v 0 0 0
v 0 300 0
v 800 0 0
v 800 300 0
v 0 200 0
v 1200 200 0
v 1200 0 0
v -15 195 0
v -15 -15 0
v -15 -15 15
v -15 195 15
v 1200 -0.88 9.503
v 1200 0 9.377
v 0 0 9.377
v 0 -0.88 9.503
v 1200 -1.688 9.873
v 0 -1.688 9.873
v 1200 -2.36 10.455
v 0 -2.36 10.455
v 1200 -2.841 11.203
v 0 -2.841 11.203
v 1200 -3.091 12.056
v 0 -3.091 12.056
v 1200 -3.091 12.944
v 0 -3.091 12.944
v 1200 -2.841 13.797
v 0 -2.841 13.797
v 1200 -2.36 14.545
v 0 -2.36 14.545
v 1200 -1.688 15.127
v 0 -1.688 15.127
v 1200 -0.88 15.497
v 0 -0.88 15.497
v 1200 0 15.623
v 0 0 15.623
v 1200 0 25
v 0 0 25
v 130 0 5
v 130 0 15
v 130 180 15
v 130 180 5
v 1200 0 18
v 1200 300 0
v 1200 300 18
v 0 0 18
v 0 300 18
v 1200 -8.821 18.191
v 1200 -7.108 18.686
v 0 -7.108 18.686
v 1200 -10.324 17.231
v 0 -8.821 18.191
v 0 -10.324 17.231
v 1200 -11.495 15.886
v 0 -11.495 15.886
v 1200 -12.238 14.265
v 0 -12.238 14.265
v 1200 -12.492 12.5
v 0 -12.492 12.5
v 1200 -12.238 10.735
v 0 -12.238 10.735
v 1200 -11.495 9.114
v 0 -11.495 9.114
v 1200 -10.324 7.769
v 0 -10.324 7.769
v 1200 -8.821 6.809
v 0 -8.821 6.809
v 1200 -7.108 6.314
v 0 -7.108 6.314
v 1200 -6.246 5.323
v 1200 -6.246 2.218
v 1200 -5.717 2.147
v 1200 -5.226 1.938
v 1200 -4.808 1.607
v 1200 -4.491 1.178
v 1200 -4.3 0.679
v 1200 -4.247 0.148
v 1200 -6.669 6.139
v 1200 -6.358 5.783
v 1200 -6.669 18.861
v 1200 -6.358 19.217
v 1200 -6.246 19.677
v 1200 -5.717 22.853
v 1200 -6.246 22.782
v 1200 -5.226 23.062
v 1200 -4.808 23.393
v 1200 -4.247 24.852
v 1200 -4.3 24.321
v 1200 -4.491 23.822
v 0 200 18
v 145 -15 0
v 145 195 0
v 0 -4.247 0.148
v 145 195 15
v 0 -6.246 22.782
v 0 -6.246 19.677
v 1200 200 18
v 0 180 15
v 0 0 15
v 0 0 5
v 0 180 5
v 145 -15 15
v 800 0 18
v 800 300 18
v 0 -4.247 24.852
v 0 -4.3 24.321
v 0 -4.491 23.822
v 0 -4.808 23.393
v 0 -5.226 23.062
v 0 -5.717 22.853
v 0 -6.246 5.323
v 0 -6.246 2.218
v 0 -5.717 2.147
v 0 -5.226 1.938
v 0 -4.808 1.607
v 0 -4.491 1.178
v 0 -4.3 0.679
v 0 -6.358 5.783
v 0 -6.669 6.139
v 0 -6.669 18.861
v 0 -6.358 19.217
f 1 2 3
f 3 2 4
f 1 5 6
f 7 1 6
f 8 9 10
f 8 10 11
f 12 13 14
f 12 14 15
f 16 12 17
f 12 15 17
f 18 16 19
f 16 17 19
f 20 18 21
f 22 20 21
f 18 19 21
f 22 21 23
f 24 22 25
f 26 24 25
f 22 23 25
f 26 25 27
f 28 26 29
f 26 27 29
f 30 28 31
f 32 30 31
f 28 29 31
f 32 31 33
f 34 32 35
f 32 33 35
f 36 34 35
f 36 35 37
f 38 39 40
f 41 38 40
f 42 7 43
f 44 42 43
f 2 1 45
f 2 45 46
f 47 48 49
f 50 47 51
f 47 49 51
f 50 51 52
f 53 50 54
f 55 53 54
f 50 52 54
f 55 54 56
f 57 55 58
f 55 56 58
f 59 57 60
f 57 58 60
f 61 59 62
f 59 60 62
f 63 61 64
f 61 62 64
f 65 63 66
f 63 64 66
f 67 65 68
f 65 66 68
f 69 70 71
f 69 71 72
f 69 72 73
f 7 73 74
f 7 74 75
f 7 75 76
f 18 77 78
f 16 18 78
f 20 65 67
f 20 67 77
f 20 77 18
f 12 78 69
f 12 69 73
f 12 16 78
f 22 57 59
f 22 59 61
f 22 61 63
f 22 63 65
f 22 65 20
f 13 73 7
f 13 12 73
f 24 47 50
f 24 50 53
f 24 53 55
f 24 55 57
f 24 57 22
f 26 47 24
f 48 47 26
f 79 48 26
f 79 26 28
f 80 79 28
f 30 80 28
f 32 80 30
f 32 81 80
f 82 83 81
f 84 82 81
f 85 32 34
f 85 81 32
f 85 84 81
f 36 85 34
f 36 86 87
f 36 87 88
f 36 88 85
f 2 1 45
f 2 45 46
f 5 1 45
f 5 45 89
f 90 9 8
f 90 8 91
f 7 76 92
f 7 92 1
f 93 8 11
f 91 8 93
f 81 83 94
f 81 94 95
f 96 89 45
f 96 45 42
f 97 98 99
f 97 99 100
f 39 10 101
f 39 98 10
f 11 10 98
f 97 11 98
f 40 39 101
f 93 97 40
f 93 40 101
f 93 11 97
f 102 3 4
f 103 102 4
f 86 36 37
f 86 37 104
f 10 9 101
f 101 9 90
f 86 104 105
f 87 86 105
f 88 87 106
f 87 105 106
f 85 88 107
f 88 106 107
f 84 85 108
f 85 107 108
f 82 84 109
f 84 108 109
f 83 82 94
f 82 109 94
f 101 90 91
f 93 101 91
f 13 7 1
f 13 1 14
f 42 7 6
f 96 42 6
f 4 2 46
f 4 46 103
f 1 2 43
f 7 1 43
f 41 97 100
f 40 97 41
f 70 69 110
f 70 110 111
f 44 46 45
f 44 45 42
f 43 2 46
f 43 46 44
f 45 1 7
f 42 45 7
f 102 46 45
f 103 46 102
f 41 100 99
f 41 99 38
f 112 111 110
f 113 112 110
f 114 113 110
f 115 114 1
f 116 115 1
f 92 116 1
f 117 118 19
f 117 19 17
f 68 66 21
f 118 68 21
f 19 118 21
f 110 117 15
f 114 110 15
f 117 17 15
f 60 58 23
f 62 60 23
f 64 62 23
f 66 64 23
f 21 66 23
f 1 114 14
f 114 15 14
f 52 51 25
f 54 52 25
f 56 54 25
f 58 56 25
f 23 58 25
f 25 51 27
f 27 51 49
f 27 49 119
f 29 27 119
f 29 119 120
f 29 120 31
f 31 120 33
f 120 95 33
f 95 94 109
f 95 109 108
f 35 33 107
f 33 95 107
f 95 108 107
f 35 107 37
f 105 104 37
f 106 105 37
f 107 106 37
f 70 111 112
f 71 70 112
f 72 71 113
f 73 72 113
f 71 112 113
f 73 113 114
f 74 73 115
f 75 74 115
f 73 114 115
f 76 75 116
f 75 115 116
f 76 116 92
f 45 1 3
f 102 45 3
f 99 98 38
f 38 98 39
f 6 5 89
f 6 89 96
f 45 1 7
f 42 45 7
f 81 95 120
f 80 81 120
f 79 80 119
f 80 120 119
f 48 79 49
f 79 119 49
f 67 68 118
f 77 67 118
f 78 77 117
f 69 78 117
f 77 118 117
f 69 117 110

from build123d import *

# Parameters (mm, degrees)
F0_W      = 1200
F0_H      = 300
F1_DEPTH  = 18
F2_W      = 1200
F2_H      = 200
F3_DEPTH  = 18
F5_DEPTH  = 1200
F6_W      = 800
F6_H      = 300
F7_DEPTH  = 18
F8_W      = 160
F8_H      = 210
F9_DEPTH  = 15
F10_W     = 130
F10_H     = 180
F11_DEPTH = 10


with BuildPart() as f1:
    # F0 (on Top) → F1 (new body)
    with BuildSketch(Plane.XY):
        with Locations((600, 150)):
            Rectangle(F0_W, F0_H)
    extrude(amount=F1_DEPTH)


with BuildPart() as f3:
    # F2 (on Top) → F3 (new body)
    with BuildSketch(Plane.XY):
        with Locations((600, 100)):
            Rectangle(F2_W, F2_H)
    extrude(amount=F3_DEPTH)


with BuildPart() as f5:
    # F4 (on Right) → F5 (new body)
    with BuildSketch(Plane.YZ):
        with BuildLine():
            Line((-4.2474110148, 0.148322861), (0, 0))
            Line((0, 0), (0, 9.3769036656))
            ThreePointArc((0, 9.3769036656), (-3.1230963344, 12.5), (0, 15.6230963344))
            Line((0, 15.6230963344), (0, 25))
            Line((0, 25), (-4.2474110148, 24.851677139))
            ThreePointArc((-4.2474110148, 24.851677139), (-4.8075130682, 23.3925614047), (-6.2461926689, 22.7818781456))
            Line((-6.2461926689, 22.7818781456), (-6.2461926689, 19.6768592152))
            ThreePointArc((-6.2461926689, 19.6768592152), (-6.49187062, 19.0203546481), (-7.108189162, 18.6864274749))
            ThreePointArc((-7.108189162, 18.6864274749), (-12.4923853377, 12.5), (-7.108189162, 6.3135725251))
            ThreePointArc((-7.108189162, 6.3135725251), (-6.49187062, 5.9796453519), (-6.2461926689, 5.3231407848))
            Line((-6.2461926689, 5.3231407848), (-6.2461926689, 2.2181218544))
            ThreePointArc((-6.2461926689, 2.2181218544), (-4.8075130682, 1.6074385953), (-4.2474110148, 0.148322861))
        make_face()
    extrude(amount=F5_DEPTH)


with BuildPart() as f7:
    # F6 (on Top) → F7 (new body)
    with BuildSketch(Plane.XY):
        with Locations((400, 150)):
            Rectangle(F6_W, F6_H)
    extrude(amount=F7_DEPTH)


with BuildPart() as f9:
    # F8 (on Top) → F9 (new body)
    with BuildSketch(Plane.XY):
        with Locations((65, 90)):
            Rectangle(F8_W, F8_H)
    extrude(amount=F9_DEPTH)

    # F10 (on face) → F11 (cut)
    with BuildSketch(Plane.XY.offset(15)):
        with Locations((65, 90)):
            Rectangle(F10_W, F10_H)
    extrude(amount=-F11_DEPTH, mode=Mode.SUBTRACT)


solid = Compound([f1.part, f3.part, f5.part, f7.part, f9.part])
